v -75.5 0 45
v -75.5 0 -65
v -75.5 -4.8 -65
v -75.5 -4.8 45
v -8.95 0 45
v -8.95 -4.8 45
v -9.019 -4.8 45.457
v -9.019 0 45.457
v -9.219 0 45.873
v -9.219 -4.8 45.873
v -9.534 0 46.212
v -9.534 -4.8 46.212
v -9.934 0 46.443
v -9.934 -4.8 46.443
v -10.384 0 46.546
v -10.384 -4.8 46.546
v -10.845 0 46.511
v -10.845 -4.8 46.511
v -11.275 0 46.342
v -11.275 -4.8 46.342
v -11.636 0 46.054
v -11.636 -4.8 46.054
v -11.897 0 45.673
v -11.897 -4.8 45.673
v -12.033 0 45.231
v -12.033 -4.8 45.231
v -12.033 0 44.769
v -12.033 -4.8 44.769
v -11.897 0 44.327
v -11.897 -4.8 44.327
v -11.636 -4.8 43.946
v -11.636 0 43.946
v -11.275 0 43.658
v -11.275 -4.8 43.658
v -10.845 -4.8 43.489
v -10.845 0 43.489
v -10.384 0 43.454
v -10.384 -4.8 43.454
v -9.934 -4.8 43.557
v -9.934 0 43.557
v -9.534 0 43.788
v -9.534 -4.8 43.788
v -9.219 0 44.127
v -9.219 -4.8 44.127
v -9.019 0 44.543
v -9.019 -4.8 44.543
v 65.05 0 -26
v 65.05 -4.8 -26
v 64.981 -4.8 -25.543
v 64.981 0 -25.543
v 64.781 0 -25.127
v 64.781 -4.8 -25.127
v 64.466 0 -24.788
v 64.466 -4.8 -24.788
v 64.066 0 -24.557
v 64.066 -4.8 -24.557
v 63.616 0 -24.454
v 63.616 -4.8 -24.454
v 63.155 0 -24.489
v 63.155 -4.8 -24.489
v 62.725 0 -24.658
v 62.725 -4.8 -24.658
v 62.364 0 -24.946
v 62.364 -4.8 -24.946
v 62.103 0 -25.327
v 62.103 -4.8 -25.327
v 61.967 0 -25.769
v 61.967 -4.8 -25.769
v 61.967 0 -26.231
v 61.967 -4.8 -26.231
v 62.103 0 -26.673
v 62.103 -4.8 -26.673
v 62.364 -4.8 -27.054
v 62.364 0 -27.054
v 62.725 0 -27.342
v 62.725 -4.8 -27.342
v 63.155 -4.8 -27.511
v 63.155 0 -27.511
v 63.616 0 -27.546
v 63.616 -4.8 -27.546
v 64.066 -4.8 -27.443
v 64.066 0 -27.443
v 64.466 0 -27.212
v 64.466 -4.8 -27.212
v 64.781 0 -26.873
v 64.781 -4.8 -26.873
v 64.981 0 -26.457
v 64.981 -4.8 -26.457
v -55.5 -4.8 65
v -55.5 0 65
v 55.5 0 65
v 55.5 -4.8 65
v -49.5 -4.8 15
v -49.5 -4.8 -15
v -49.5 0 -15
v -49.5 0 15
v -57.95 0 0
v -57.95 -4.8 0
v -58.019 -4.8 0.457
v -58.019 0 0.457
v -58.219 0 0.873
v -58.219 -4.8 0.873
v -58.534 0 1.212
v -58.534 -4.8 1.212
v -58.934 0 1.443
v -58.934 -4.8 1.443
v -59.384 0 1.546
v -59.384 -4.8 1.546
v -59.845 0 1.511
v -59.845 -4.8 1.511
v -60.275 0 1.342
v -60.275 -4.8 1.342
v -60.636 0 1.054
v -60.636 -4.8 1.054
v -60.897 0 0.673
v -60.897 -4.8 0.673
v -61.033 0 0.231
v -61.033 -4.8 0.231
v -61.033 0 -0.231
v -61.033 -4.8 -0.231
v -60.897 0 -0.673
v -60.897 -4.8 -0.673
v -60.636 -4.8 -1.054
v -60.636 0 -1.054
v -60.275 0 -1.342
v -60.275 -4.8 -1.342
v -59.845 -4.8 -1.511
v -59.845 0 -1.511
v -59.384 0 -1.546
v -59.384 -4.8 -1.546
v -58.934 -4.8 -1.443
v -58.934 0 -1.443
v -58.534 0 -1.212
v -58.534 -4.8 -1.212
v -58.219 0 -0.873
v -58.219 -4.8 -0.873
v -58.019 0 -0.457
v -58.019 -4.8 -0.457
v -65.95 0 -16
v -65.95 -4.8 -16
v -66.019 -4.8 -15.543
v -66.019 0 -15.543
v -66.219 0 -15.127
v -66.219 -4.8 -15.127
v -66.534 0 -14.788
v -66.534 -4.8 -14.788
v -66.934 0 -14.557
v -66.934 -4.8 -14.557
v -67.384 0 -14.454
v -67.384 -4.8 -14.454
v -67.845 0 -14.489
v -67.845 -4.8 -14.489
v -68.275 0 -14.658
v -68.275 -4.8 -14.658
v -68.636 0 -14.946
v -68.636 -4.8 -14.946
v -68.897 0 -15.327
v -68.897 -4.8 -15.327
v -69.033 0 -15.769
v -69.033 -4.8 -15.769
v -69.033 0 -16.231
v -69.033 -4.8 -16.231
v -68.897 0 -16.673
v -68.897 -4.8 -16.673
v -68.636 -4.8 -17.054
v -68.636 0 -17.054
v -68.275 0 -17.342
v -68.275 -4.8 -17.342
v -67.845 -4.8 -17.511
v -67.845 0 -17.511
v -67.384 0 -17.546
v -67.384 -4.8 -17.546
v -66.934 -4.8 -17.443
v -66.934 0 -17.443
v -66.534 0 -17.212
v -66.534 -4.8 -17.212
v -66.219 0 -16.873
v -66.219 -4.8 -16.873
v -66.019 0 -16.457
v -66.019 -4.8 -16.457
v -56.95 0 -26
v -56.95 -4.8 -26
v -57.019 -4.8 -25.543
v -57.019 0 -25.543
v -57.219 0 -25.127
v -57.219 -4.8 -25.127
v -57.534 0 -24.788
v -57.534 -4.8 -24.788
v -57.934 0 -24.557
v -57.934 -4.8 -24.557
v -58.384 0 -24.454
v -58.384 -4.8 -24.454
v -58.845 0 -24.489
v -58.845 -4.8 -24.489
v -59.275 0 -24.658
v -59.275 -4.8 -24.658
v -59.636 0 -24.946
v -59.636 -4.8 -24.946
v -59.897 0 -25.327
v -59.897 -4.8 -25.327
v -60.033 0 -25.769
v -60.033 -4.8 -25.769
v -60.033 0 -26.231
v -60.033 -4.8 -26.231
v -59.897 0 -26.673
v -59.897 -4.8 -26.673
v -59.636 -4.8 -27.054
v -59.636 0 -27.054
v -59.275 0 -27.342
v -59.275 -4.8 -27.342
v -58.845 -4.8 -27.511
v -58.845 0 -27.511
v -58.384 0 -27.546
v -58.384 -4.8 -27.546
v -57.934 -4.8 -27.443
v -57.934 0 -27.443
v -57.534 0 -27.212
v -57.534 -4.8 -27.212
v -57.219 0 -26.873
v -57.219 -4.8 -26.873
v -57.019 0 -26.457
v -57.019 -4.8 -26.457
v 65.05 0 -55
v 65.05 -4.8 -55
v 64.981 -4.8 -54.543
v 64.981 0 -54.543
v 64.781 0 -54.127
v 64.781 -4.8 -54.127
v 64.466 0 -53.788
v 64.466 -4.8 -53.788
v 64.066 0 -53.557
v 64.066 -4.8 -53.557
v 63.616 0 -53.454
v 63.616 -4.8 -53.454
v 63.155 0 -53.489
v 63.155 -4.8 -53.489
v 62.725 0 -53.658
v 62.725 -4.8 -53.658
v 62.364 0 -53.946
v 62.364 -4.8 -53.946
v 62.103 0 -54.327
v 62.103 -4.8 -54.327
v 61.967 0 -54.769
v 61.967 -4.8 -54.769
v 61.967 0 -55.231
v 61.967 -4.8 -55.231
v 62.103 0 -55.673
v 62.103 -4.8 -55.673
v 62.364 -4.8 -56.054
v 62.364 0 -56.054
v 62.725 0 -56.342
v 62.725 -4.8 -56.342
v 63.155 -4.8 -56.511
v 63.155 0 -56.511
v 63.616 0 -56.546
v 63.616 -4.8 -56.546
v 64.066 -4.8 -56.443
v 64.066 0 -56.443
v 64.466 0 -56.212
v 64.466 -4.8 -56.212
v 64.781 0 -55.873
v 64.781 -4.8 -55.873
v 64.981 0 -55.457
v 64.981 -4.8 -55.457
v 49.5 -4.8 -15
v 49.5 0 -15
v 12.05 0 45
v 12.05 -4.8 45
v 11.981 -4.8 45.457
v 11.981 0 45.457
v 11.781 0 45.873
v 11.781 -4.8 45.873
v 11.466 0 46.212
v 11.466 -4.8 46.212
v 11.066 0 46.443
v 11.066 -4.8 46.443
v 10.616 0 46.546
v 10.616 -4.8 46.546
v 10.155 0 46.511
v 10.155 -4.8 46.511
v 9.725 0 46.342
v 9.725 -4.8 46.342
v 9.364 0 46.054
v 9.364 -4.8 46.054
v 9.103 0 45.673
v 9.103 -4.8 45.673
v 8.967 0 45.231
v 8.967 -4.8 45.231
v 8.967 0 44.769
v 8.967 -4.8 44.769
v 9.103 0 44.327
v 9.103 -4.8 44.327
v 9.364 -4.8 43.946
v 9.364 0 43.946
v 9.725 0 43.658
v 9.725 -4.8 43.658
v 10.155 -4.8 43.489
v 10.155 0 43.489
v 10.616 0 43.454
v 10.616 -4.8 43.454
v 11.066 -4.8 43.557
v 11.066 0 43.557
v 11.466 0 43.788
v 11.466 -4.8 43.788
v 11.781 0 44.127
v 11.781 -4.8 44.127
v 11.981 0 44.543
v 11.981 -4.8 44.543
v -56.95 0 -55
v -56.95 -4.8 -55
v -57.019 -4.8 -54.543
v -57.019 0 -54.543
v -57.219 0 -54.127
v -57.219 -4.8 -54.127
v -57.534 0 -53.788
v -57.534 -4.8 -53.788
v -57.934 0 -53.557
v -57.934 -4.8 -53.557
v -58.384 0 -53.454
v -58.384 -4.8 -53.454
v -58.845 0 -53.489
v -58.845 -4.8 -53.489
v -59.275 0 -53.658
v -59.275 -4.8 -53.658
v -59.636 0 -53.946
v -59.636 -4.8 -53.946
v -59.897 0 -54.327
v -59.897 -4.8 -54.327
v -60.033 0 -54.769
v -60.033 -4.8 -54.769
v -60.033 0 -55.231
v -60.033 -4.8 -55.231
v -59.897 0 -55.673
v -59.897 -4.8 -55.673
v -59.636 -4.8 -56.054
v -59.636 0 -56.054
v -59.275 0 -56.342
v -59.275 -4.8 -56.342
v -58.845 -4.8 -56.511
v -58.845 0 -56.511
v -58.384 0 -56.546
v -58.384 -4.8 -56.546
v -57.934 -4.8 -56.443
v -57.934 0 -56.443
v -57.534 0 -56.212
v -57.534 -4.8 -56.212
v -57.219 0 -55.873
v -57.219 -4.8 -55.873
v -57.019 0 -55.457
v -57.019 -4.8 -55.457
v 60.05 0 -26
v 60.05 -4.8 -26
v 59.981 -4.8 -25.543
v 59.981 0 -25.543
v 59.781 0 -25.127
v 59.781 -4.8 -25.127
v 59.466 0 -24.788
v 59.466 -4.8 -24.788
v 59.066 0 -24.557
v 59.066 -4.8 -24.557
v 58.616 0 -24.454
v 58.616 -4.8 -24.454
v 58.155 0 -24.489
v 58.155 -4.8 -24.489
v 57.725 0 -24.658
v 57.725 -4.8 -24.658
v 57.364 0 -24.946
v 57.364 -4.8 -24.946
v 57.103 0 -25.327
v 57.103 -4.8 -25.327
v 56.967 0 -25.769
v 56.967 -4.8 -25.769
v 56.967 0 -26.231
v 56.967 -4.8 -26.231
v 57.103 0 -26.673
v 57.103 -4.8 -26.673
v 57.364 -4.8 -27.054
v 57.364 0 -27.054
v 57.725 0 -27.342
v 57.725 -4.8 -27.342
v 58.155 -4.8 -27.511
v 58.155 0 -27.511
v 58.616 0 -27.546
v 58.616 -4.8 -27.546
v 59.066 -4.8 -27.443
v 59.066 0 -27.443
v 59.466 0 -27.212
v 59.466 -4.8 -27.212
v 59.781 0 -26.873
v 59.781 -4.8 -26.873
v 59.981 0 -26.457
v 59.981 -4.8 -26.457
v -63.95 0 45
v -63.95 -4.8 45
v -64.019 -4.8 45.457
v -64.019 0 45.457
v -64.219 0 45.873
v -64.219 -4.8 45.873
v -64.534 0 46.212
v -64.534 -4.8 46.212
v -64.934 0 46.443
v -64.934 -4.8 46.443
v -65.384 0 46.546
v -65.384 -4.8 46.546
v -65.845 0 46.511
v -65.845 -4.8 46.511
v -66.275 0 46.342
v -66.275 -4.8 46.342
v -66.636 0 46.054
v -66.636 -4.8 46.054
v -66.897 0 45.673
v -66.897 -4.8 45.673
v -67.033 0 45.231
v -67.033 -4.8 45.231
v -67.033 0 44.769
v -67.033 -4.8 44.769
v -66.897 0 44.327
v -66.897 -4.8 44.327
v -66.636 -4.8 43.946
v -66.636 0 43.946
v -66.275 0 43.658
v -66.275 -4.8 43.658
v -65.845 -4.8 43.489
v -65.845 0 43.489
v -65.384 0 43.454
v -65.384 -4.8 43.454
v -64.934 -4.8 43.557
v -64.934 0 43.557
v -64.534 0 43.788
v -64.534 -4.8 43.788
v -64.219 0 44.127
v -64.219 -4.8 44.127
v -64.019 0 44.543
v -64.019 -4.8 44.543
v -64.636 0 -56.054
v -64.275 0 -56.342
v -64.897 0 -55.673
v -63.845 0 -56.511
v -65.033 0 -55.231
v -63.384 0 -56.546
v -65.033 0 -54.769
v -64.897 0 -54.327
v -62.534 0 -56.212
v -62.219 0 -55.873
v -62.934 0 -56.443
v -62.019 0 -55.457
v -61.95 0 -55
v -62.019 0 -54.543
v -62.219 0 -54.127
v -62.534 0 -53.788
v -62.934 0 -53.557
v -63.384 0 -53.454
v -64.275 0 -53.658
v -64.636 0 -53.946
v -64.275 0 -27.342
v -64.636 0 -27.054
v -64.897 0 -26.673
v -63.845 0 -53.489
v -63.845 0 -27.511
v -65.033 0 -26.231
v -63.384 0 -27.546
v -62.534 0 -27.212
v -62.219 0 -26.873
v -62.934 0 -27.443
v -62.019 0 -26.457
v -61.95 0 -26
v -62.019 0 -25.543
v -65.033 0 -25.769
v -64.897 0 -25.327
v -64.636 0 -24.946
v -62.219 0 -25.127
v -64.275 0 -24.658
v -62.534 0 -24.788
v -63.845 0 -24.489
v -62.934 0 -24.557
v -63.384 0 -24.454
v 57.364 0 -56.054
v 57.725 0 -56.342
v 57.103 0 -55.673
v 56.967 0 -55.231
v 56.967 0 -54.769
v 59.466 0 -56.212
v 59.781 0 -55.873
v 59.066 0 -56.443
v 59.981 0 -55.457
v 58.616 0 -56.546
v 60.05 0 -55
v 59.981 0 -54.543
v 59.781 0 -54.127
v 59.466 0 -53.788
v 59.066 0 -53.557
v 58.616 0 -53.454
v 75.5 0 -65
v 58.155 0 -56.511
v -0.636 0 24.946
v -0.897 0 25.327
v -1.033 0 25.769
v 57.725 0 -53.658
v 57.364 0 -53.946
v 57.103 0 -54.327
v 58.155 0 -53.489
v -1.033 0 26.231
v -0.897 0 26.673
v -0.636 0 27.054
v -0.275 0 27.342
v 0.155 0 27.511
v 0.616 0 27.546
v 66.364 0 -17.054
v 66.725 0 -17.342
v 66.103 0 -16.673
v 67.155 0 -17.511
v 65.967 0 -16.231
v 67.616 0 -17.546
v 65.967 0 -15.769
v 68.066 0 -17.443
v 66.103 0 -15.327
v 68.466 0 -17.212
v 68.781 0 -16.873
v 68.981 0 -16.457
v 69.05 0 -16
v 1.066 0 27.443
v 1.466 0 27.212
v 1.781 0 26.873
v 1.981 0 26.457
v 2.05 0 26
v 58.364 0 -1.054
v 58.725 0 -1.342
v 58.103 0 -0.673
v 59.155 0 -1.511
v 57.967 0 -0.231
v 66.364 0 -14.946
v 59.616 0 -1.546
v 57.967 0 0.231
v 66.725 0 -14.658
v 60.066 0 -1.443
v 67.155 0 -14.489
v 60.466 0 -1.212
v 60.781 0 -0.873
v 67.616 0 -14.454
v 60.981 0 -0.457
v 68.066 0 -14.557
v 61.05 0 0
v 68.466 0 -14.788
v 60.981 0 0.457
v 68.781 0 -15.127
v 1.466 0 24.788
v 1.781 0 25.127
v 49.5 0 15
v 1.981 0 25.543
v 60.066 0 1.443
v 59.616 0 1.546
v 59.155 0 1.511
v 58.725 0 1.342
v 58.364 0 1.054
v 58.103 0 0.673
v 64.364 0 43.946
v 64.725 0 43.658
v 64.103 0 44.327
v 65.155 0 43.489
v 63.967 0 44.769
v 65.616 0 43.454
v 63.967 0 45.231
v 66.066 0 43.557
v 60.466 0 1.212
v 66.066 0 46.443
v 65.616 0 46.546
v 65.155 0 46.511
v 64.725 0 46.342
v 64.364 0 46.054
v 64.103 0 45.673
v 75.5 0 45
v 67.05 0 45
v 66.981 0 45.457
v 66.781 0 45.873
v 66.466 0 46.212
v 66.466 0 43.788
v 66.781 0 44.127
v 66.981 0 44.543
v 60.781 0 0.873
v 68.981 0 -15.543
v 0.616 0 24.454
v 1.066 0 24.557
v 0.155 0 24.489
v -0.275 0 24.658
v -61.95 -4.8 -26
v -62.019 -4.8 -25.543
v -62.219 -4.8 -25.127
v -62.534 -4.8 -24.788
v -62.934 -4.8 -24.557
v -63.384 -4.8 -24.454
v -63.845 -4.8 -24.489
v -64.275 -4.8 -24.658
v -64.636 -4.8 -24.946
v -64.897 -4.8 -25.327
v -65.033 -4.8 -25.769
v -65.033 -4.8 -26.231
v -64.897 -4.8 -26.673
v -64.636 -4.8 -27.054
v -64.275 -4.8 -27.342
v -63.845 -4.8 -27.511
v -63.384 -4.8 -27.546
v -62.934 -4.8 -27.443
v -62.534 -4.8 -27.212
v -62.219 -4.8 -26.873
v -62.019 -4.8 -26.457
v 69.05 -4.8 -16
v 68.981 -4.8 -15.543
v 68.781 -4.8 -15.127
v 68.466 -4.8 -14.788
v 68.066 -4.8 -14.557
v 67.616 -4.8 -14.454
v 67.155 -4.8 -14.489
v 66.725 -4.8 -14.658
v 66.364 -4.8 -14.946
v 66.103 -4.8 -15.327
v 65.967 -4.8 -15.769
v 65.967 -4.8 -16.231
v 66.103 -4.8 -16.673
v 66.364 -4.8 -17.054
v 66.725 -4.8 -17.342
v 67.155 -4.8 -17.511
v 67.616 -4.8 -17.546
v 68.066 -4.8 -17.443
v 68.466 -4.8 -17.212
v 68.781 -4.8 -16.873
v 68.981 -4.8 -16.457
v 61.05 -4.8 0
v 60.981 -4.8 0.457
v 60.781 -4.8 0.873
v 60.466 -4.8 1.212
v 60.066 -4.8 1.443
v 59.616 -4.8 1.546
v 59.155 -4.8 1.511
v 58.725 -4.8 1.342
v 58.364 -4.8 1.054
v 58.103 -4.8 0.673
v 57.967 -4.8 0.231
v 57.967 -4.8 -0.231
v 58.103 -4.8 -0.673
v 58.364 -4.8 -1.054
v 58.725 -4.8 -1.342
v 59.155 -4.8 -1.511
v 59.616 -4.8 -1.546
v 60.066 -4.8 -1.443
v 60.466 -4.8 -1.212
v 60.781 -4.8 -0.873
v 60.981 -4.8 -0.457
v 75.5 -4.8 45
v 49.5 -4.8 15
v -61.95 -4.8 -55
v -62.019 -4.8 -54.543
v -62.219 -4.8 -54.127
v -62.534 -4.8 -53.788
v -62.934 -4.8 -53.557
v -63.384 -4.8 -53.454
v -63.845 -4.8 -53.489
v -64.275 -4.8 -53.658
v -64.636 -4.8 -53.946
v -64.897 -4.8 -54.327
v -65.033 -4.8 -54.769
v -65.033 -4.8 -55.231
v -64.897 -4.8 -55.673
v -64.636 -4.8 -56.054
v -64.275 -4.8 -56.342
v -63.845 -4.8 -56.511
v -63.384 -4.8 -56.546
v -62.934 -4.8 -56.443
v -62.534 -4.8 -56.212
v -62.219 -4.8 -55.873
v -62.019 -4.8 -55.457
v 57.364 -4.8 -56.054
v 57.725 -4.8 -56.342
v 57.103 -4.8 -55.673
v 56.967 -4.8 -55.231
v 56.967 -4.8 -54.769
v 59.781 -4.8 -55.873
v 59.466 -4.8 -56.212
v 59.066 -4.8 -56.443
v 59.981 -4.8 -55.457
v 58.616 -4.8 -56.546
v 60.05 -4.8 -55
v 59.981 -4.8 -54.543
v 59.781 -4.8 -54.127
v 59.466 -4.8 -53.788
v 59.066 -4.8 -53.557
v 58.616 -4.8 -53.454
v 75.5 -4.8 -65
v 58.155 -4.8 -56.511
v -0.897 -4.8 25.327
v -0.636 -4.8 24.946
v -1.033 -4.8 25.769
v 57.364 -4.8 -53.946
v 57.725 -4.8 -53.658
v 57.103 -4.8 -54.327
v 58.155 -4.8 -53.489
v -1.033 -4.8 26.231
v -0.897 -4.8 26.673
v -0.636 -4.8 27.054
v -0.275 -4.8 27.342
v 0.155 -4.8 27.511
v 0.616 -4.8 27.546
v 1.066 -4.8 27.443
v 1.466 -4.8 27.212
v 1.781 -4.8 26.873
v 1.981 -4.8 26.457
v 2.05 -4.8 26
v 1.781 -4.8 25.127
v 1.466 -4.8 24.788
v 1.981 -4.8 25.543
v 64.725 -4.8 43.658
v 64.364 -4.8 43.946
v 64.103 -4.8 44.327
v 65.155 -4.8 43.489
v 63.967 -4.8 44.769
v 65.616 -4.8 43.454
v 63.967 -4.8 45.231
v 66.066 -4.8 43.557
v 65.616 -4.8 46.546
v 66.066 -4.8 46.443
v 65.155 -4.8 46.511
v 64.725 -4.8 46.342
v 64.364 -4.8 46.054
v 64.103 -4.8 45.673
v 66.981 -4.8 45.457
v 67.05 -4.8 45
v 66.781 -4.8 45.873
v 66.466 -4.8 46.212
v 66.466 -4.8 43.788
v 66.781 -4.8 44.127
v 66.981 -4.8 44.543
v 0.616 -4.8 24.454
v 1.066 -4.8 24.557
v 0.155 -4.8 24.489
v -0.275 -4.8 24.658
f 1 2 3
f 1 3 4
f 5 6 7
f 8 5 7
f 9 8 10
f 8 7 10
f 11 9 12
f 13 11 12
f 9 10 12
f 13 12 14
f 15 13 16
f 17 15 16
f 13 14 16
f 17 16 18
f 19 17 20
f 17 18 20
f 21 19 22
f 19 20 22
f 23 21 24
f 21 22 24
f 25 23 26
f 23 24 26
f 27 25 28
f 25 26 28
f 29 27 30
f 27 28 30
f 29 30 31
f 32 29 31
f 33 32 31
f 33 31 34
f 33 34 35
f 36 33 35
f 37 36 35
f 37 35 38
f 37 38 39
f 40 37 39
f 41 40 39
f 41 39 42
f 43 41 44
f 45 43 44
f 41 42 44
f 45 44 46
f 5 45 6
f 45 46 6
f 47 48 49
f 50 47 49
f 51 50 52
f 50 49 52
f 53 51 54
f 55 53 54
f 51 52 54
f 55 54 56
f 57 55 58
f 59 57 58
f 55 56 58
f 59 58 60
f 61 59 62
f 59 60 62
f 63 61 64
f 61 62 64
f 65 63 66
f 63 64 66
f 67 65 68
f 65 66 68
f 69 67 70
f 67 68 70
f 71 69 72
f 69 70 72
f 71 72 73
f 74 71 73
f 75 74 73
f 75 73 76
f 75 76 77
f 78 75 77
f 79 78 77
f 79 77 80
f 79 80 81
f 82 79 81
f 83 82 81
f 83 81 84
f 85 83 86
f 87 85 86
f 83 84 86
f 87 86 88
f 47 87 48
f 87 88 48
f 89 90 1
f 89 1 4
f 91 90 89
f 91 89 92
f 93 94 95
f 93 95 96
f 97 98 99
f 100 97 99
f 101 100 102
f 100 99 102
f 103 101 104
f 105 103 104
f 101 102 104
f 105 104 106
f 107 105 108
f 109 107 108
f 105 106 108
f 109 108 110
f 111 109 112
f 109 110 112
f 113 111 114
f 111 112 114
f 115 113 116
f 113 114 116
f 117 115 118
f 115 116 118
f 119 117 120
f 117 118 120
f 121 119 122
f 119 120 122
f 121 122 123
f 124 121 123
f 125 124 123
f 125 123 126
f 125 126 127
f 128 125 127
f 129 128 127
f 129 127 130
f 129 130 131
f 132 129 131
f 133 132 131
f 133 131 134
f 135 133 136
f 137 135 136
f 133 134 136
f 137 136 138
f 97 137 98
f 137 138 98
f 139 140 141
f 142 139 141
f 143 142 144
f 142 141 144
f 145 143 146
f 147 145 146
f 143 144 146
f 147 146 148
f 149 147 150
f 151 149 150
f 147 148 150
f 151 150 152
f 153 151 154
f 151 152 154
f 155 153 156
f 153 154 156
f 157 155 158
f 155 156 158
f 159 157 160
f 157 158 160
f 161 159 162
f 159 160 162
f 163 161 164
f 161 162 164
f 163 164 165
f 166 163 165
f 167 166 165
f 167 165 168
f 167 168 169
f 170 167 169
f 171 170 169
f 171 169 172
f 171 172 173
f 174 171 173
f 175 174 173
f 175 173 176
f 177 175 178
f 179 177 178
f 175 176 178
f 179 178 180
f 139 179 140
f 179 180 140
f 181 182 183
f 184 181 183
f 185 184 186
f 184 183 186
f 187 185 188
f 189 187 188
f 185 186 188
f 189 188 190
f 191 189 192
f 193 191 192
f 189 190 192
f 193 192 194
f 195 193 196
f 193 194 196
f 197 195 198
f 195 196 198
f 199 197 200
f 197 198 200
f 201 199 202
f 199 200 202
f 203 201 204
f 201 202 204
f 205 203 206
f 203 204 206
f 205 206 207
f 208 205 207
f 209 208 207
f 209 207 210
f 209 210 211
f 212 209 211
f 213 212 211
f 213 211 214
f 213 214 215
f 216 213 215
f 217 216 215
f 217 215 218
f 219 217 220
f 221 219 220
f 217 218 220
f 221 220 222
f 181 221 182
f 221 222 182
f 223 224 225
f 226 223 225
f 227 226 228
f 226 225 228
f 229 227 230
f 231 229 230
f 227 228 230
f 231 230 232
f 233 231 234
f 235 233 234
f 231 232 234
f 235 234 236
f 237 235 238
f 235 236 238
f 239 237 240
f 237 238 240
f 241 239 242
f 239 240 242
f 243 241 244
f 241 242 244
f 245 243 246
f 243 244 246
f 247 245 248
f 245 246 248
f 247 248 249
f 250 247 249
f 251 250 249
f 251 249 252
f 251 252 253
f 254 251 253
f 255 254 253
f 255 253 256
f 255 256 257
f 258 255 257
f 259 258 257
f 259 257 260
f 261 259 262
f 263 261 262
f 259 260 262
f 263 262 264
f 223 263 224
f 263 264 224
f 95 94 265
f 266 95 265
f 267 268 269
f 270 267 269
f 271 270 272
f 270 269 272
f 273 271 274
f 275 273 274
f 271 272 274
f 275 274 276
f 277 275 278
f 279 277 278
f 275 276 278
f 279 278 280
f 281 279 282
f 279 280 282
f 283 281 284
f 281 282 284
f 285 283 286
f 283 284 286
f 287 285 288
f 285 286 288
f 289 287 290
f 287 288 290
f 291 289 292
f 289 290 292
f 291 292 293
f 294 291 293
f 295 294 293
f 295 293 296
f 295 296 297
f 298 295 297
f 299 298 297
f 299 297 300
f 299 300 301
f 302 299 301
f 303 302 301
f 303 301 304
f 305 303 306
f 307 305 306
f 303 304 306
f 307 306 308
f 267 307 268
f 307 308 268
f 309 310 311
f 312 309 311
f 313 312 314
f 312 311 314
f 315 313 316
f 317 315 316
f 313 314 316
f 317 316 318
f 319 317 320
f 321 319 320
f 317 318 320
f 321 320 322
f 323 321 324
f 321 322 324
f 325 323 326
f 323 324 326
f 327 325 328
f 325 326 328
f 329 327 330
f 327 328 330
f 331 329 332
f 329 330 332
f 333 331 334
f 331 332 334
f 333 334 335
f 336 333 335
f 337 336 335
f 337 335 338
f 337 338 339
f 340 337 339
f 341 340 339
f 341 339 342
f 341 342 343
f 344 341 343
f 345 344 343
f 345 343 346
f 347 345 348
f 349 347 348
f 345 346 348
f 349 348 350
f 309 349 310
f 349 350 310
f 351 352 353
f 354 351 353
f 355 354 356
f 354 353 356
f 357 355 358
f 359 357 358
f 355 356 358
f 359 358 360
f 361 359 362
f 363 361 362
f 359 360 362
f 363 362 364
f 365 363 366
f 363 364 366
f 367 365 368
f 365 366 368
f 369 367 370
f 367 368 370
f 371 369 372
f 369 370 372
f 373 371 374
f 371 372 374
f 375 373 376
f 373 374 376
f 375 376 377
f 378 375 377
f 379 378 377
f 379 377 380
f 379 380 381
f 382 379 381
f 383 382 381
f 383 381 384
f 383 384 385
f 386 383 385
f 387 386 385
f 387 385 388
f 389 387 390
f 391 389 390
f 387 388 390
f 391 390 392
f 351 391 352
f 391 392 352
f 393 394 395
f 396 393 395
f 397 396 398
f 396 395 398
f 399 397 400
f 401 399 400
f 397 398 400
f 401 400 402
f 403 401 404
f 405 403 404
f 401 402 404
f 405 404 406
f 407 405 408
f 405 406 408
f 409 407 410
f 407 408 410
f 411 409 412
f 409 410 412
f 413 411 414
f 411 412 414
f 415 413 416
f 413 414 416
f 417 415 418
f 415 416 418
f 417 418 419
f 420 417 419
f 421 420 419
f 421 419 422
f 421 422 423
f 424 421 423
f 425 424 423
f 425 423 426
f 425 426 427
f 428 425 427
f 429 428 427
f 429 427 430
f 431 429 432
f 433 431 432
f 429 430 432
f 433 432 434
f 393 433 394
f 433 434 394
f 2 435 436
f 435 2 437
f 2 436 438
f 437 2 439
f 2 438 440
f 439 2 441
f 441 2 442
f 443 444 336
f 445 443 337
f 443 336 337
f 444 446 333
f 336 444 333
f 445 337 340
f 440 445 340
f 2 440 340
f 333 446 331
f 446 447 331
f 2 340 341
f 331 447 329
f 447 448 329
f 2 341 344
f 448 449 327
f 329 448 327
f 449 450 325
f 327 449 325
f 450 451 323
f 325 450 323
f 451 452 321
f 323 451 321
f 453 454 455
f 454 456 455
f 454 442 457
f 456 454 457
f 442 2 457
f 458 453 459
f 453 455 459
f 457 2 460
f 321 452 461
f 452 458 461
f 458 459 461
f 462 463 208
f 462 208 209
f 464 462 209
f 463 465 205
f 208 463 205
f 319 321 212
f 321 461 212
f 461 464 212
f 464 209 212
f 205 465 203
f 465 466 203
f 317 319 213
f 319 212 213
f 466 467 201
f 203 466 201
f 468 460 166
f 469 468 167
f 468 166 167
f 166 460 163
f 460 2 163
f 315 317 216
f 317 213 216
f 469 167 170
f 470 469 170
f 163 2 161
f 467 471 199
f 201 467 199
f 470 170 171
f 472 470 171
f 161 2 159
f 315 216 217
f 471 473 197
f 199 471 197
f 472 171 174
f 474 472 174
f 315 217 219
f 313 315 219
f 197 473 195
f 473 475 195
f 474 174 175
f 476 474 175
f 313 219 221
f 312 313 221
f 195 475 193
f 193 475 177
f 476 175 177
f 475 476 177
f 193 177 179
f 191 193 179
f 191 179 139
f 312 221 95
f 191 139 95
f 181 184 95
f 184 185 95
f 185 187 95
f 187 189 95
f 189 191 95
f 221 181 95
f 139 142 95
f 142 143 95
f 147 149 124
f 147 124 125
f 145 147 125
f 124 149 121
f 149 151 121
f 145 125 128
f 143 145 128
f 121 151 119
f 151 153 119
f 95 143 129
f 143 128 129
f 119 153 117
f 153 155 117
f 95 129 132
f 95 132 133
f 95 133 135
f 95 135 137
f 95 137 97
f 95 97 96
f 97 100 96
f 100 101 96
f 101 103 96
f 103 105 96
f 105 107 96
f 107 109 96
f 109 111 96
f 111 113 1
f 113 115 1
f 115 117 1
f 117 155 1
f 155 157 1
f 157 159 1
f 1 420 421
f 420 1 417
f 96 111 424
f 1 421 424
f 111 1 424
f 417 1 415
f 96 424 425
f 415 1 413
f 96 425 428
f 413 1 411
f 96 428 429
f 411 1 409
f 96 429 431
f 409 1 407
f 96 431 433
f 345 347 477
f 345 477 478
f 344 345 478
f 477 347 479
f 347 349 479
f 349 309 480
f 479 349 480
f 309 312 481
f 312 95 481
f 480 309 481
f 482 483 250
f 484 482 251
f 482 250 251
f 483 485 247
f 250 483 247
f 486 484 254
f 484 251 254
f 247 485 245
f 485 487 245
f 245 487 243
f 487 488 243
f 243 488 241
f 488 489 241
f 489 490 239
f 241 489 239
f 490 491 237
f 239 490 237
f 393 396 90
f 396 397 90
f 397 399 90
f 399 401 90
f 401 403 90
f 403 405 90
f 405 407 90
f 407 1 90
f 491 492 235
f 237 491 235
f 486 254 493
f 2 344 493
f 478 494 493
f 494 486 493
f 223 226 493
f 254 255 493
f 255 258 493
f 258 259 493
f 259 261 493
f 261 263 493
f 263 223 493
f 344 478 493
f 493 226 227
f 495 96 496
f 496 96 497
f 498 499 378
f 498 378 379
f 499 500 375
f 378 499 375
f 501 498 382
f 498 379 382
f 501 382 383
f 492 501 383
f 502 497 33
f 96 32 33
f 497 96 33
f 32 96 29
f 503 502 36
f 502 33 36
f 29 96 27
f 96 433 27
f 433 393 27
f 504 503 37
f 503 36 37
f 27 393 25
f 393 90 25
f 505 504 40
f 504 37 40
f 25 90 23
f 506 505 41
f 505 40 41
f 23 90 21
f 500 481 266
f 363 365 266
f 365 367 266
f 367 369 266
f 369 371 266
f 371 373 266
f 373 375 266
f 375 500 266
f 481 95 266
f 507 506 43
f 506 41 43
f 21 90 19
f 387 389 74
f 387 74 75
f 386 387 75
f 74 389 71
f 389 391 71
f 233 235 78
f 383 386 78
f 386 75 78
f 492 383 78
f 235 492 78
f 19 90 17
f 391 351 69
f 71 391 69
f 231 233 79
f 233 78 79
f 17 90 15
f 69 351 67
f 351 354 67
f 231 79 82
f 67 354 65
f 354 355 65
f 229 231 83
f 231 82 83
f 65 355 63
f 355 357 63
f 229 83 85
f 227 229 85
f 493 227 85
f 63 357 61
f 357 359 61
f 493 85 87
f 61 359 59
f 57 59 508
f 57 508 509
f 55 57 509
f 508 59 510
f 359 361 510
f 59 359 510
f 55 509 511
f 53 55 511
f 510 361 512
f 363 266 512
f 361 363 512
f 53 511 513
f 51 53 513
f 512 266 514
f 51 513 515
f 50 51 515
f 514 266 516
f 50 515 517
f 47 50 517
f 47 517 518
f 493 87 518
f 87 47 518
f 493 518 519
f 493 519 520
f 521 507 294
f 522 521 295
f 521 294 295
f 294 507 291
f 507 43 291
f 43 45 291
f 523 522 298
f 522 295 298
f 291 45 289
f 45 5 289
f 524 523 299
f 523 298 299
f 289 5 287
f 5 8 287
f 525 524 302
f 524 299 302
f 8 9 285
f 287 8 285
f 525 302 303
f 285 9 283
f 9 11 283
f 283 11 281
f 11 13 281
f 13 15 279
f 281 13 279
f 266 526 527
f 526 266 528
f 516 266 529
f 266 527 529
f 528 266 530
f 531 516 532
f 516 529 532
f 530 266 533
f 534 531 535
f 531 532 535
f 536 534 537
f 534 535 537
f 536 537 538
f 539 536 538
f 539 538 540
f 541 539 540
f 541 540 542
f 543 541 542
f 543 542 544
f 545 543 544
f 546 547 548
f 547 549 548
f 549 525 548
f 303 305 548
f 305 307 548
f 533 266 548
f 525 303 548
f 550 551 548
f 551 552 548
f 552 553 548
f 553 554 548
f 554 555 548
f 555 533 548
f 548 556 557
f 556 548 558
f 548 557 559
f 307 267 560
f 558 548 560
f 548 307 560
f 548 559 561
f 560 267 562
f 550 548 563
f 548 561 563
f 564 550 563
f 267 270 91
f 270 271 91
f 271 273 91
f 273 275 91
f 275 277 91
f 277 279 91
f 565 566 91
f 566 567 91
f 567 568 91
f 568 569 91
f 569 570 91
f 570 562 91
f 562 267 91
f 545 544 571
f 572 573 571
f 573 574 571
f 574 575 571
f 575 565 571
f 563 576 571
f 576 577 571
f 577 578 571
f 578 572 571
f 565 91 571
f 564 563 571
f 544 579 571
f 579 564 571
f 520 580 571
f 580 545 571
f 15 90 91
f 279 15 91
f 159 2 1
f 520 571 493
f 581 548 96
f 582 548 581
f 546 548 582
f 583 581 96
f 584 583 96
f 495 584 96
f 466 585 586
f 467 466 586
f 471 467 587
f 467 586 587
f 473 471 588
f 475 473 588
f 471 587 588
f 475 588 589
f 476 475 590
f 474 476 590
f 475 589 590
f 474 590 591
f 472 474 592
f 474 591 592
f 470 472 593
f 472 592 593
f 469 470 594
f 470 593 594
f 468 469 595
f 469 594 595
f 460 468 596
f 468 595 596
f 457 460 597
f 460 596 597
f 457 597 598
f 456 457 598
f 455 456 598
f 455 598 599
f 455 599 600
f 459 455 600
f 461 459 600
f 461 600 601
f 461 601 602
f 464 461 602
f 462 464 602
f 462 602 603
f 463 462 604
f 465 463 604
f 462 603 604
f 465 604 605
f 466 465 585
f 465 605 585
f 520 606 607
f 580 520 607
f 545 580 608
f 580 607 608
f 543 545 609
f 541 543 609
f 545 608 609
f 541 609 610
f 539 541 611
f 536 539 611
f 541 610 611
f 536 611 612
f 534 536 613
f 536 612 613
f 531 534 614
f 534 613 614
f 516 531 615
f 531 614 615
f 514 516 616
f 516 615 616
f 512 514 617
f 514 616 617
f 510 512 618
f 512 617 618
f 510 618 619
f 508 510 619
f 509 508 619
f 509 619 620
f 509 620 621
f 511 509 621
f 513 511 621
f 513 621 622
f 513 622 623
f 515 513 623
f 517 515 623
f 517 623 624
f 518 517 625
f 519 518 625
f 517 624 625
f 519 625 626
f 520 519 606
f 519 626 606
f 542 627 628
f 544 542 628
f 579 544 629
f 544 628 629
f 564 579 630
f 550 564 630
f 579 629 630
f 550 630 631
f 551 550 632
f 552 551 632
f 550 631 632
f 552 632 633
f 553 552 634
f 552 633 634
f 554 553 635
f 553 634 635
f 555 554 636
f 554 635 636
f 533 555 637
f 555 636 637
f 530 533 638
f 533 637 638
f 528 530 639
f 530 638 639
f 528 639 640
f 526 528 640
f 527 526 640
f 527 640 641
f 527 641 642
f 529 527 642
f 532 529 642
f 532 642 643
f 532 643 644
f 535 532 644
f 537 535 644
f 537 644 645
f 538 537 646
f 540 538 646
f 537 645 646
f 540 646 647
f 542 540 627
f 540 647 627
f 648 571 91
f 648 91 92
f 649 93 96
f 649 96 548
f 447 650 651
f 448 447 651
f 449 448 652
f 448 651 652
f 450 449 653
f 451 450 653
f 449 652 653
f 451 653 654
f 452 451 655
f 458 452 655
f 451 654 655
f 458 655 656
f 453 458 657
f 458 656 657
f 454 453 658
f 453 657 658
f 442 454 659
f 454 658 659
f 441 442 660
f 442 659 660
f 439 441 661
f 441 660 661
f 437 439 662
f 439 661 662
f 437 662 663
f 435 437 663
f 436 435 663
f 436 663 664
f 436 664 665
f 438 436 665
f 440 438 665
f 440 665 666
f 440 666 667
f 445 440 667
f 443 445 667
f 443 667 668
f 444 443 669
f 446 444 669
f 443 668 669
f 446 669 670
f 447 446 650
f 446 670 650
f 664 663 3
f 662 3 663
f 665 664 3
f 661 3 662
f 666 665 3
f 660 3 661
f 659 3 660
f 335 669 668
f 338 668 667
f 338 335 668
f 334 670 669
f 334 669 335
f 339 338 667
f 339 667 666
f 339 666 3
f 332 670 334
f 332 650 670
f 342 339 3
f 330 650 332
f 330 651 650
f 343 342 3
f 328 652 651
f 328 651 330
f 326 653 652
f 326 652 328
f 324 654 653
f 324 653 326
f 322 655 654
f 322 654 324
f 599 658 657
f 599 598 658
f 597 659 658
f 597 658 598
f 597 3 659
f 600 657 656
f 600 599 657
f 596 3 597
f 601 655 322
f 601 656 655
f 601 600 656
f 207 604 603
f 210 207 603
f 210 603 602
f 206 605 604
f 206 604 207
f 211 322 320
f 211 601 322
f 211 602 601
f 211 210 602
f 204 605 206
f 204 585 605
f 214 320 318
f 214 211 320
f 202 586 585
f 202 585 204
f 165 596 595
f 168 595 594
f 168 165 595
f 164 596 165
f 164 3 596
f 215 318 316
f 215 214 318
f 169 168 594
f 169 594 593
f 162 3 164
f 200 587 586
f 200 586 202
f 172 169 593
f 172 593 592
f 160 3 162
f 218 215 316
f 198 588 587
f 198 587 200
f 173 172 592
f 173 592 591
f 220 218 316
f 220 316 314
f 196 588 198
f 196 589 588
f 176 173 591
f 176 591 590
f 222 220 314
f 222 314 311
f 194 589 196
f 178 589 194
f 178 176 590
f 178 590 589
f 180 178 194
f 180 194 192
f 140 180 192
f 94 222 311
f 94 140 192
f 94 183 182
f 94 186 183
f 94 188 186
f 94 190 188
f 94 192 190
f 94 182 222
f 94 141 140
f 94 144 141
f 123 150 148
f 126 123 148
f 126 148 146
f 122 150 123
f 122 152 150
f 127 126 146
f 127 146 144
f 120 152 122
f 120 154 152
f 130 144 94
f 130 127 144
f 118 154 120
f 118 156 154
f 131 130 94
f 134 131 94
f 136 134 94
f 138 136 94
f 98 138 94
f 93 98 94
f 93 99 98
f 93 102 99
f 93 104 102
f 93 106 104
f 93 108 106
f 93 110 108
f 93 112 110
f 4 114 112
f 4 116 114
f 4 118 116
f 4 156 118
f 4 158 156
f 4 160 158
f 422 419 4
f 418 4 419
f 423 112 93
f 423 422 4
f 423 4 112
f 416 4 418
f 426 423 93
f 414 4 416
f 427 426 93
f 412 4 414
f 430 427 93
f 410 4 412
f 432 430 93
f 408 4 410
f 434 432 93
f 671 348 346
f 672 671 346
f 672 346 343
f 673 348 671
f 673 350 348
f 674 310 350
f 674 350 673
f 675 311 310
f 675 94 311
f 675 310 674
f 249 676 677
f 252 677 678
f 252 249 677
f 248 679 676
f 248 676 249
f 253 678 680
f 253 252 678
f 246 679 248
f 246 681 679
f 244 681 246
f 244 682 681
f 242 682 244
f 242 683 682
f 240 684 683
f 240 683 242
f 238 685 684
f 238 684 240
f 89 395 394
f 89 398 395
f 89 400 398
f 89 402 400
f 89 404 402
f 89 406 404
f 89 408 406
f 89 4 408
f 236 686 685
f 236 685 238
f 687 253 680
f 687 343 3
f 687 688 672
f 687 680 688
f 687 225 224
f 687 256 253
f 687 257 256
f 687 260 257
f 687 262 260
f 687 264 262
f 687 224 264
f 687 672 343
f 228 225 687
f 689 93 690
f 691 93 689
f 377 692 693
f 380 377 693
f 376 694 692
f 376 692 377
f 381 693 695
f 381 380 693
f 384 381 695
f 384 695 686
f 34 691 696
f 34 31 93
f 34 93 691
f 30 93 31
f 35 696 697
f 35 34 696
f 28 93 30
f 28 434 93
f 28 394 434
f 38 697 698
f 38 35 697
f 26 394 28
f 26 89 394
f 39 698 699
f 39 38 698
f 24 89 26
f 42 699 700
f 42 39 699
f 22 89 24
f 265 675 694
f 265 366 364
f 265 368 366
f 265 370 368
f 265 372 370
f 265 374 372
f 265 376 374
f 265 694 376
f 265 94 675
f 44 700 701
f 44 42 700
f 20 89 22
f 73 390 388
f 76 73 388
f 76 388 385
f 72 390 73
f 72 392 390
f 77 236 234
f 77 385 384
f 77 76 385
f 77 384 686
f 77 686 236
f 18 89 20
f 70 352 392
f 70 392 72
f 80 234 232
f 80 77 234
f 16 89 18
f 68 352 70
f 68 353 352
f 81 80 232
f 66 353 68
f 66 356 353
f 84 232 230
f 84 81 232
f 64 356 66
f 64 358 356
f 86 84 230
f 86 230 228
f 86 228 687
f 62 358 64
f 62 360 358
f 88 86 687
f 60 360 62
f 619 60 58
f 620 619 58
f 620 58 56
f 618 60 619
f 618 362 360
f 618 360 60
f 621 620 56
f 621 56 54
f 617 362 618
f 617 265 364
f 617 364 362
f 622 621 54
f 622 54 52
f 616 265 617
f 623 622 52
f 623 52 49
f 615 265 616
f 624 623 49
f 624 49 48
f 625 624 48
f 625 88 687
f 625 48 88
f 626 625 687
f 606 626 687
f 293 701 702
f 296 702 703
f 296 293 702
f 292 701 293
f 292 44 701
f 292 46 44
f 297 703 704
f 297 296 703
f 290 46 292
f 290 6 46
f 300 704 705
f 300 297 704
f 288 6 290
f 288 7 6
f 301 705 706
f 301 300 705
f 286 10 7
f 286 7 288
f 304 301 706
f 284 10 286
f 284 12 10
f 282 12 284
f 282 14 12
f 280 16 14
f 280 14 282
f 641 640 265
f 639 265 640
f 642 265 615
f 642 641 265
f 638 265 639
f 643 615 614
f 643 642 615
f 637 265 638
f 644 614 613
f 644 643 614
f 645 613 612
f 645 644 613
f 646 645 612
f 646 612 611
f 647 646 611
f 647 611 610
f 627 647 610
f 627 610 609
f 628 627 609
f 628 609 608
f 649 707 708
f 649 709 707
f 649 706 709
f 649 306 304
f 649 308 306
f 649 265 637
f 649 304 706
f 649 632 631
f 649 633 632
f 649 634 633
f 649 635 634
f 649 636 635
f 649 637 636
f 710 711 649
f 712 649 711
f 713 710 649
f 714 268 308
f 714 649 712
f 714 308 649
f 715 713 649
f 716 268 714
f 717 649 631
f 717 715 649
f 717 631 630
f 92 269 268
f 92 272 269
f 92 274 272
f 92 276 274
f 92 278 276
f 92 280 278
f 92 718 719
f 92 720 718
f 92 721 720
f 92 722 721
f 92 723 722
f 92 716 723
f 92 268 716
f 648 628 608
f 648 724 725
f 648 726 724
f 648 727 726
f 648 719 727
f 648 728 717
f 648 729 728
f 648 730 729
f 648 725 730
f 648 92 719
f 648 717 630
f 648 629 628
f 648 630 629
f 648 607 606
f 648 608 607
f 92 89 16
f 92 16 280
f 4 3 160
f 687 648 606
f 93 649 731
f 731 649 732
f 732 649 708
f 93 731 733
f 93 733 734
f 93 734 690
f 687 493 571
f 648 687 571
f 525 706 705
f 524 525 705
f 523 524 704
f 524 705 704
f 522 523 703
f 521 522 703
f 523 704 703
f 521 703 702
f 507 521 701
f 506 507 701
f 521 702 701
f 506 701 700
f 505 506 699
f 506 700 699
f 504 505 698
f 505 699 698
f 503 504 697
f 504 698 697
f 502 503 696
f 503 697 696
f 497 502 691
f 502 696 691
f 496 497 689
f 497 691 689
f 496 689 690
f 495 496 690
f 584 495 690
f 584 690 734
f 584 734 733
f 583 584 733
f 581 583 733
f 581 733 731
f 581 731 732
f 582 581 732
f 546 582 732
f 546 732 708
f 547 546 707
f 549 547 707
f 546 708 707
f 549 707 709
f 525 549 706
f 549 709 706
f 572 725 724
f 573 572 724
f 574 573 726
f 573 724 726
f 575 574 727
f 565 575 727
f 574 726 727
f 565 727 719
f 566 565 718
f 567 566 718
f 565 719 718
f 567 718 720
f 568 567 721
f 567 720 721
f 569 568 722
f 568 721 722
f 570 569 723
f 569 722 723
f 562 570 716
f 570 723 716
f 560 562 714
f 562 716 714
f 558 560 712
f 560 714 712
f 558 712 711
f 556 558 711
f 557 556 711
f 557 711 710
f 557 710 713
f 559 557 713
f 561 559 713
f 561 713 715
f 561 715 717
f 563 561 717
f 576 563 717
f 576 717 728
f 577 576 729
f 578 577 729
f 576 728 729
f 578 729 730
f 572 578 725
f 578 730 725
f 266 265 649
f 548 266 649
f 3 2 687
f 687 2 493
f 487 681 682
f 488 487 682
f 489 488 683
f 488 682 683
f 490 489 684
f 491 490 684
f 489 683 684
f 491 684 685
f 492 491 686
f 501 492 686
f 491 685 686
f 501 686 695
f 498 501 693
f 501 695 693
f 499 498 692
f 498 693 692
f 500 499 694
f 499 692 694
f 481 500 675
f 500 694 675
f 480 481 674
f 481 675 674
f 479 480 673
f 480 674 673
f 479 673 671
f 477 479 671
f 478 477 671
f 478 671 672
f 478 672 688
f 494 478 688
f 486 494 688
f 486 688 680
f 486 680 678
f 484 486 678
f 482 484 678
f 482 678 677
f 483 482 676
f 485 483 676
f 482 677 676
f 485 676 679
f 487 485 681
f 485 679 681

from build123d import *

# Parameters (mm, degrees)
F0_W     = 151
F0_H     = 130
F1_DEPTH = 4.8
F2_W     = 99
F2_H     = 30
F2_R     = 1.55
F3_DEPTH = 4.8
F4_SIZE  = 20
F5_SIZE  = 20


with BuildPart() as f1:
    # F0 (on Front) → F1 (new body)
    with BuildSketch(Plane.XZ):
        Rectangle(F0_W, F0_H)
    extrude(amount=F1_DEPTH)

    # F2 (on face) → F3 (cut)
    with BuildSketch(Plane.XZ.offset(4.8)):
        Rectangle(F2_W, F2_H)
        with Locations((-59.5, 0)):
            Circle(F2_R)
        with Locations((59.5, 0)):
            Circle(F2_R)
        with Locations((-63.5, -55)):
            Circle(F2_R)
        with Locations((63.5, -55)):
            Circle(F2_R)
        with Locations((-58.5, -55)):
            Circle(F2_R)
        with Locations((58.5, -55)):
            Circle(F2_R)
        with Locations((-63.5, -26)):
            Circle(F2_R)
        with Locations((-58.5, -26)):
            Circle(F2_R)
        with Locations((63.5, -26)):
            Circle(F2_R)
        with Locations((58.5, -26)):
            Circle(F2_R)
        with Locations((65.5, 45)):
            Circle(F2_R)
        with Locations((-65.5, 45)):
            Circle(F2_R)
        with Locations((67.5, -16)):
            Circle(F2_R)
        with Locations((-67.5, -16)):
            Circle(F2_R)
        with Locations((10.5, 45)):
            Circle(F2_R)
        with Locations((-10.5, 45)):
            Circle(F2_R)
        with Locations((0.5, 26)):
            Circle(F2_R)
    extrude(amount=-F3_DEPTH, mode=Mode.SUBTRACT)

    # F4
    f4_edges = [f1.edges().sort_by_distance(p)[0] for p in [
        (-75.5, -2.4, 65),
    ]]
    chamfer(f4_edges, length=F4_SIZE)

    # F5
    f5_edges = [f1.edges().sort_by_distance(p)[0] for p in [
        (75.5, -2.4, 65),
    ]]
    chamfer(f5_edges, length=F5_SIZE)


solid = f1.part
